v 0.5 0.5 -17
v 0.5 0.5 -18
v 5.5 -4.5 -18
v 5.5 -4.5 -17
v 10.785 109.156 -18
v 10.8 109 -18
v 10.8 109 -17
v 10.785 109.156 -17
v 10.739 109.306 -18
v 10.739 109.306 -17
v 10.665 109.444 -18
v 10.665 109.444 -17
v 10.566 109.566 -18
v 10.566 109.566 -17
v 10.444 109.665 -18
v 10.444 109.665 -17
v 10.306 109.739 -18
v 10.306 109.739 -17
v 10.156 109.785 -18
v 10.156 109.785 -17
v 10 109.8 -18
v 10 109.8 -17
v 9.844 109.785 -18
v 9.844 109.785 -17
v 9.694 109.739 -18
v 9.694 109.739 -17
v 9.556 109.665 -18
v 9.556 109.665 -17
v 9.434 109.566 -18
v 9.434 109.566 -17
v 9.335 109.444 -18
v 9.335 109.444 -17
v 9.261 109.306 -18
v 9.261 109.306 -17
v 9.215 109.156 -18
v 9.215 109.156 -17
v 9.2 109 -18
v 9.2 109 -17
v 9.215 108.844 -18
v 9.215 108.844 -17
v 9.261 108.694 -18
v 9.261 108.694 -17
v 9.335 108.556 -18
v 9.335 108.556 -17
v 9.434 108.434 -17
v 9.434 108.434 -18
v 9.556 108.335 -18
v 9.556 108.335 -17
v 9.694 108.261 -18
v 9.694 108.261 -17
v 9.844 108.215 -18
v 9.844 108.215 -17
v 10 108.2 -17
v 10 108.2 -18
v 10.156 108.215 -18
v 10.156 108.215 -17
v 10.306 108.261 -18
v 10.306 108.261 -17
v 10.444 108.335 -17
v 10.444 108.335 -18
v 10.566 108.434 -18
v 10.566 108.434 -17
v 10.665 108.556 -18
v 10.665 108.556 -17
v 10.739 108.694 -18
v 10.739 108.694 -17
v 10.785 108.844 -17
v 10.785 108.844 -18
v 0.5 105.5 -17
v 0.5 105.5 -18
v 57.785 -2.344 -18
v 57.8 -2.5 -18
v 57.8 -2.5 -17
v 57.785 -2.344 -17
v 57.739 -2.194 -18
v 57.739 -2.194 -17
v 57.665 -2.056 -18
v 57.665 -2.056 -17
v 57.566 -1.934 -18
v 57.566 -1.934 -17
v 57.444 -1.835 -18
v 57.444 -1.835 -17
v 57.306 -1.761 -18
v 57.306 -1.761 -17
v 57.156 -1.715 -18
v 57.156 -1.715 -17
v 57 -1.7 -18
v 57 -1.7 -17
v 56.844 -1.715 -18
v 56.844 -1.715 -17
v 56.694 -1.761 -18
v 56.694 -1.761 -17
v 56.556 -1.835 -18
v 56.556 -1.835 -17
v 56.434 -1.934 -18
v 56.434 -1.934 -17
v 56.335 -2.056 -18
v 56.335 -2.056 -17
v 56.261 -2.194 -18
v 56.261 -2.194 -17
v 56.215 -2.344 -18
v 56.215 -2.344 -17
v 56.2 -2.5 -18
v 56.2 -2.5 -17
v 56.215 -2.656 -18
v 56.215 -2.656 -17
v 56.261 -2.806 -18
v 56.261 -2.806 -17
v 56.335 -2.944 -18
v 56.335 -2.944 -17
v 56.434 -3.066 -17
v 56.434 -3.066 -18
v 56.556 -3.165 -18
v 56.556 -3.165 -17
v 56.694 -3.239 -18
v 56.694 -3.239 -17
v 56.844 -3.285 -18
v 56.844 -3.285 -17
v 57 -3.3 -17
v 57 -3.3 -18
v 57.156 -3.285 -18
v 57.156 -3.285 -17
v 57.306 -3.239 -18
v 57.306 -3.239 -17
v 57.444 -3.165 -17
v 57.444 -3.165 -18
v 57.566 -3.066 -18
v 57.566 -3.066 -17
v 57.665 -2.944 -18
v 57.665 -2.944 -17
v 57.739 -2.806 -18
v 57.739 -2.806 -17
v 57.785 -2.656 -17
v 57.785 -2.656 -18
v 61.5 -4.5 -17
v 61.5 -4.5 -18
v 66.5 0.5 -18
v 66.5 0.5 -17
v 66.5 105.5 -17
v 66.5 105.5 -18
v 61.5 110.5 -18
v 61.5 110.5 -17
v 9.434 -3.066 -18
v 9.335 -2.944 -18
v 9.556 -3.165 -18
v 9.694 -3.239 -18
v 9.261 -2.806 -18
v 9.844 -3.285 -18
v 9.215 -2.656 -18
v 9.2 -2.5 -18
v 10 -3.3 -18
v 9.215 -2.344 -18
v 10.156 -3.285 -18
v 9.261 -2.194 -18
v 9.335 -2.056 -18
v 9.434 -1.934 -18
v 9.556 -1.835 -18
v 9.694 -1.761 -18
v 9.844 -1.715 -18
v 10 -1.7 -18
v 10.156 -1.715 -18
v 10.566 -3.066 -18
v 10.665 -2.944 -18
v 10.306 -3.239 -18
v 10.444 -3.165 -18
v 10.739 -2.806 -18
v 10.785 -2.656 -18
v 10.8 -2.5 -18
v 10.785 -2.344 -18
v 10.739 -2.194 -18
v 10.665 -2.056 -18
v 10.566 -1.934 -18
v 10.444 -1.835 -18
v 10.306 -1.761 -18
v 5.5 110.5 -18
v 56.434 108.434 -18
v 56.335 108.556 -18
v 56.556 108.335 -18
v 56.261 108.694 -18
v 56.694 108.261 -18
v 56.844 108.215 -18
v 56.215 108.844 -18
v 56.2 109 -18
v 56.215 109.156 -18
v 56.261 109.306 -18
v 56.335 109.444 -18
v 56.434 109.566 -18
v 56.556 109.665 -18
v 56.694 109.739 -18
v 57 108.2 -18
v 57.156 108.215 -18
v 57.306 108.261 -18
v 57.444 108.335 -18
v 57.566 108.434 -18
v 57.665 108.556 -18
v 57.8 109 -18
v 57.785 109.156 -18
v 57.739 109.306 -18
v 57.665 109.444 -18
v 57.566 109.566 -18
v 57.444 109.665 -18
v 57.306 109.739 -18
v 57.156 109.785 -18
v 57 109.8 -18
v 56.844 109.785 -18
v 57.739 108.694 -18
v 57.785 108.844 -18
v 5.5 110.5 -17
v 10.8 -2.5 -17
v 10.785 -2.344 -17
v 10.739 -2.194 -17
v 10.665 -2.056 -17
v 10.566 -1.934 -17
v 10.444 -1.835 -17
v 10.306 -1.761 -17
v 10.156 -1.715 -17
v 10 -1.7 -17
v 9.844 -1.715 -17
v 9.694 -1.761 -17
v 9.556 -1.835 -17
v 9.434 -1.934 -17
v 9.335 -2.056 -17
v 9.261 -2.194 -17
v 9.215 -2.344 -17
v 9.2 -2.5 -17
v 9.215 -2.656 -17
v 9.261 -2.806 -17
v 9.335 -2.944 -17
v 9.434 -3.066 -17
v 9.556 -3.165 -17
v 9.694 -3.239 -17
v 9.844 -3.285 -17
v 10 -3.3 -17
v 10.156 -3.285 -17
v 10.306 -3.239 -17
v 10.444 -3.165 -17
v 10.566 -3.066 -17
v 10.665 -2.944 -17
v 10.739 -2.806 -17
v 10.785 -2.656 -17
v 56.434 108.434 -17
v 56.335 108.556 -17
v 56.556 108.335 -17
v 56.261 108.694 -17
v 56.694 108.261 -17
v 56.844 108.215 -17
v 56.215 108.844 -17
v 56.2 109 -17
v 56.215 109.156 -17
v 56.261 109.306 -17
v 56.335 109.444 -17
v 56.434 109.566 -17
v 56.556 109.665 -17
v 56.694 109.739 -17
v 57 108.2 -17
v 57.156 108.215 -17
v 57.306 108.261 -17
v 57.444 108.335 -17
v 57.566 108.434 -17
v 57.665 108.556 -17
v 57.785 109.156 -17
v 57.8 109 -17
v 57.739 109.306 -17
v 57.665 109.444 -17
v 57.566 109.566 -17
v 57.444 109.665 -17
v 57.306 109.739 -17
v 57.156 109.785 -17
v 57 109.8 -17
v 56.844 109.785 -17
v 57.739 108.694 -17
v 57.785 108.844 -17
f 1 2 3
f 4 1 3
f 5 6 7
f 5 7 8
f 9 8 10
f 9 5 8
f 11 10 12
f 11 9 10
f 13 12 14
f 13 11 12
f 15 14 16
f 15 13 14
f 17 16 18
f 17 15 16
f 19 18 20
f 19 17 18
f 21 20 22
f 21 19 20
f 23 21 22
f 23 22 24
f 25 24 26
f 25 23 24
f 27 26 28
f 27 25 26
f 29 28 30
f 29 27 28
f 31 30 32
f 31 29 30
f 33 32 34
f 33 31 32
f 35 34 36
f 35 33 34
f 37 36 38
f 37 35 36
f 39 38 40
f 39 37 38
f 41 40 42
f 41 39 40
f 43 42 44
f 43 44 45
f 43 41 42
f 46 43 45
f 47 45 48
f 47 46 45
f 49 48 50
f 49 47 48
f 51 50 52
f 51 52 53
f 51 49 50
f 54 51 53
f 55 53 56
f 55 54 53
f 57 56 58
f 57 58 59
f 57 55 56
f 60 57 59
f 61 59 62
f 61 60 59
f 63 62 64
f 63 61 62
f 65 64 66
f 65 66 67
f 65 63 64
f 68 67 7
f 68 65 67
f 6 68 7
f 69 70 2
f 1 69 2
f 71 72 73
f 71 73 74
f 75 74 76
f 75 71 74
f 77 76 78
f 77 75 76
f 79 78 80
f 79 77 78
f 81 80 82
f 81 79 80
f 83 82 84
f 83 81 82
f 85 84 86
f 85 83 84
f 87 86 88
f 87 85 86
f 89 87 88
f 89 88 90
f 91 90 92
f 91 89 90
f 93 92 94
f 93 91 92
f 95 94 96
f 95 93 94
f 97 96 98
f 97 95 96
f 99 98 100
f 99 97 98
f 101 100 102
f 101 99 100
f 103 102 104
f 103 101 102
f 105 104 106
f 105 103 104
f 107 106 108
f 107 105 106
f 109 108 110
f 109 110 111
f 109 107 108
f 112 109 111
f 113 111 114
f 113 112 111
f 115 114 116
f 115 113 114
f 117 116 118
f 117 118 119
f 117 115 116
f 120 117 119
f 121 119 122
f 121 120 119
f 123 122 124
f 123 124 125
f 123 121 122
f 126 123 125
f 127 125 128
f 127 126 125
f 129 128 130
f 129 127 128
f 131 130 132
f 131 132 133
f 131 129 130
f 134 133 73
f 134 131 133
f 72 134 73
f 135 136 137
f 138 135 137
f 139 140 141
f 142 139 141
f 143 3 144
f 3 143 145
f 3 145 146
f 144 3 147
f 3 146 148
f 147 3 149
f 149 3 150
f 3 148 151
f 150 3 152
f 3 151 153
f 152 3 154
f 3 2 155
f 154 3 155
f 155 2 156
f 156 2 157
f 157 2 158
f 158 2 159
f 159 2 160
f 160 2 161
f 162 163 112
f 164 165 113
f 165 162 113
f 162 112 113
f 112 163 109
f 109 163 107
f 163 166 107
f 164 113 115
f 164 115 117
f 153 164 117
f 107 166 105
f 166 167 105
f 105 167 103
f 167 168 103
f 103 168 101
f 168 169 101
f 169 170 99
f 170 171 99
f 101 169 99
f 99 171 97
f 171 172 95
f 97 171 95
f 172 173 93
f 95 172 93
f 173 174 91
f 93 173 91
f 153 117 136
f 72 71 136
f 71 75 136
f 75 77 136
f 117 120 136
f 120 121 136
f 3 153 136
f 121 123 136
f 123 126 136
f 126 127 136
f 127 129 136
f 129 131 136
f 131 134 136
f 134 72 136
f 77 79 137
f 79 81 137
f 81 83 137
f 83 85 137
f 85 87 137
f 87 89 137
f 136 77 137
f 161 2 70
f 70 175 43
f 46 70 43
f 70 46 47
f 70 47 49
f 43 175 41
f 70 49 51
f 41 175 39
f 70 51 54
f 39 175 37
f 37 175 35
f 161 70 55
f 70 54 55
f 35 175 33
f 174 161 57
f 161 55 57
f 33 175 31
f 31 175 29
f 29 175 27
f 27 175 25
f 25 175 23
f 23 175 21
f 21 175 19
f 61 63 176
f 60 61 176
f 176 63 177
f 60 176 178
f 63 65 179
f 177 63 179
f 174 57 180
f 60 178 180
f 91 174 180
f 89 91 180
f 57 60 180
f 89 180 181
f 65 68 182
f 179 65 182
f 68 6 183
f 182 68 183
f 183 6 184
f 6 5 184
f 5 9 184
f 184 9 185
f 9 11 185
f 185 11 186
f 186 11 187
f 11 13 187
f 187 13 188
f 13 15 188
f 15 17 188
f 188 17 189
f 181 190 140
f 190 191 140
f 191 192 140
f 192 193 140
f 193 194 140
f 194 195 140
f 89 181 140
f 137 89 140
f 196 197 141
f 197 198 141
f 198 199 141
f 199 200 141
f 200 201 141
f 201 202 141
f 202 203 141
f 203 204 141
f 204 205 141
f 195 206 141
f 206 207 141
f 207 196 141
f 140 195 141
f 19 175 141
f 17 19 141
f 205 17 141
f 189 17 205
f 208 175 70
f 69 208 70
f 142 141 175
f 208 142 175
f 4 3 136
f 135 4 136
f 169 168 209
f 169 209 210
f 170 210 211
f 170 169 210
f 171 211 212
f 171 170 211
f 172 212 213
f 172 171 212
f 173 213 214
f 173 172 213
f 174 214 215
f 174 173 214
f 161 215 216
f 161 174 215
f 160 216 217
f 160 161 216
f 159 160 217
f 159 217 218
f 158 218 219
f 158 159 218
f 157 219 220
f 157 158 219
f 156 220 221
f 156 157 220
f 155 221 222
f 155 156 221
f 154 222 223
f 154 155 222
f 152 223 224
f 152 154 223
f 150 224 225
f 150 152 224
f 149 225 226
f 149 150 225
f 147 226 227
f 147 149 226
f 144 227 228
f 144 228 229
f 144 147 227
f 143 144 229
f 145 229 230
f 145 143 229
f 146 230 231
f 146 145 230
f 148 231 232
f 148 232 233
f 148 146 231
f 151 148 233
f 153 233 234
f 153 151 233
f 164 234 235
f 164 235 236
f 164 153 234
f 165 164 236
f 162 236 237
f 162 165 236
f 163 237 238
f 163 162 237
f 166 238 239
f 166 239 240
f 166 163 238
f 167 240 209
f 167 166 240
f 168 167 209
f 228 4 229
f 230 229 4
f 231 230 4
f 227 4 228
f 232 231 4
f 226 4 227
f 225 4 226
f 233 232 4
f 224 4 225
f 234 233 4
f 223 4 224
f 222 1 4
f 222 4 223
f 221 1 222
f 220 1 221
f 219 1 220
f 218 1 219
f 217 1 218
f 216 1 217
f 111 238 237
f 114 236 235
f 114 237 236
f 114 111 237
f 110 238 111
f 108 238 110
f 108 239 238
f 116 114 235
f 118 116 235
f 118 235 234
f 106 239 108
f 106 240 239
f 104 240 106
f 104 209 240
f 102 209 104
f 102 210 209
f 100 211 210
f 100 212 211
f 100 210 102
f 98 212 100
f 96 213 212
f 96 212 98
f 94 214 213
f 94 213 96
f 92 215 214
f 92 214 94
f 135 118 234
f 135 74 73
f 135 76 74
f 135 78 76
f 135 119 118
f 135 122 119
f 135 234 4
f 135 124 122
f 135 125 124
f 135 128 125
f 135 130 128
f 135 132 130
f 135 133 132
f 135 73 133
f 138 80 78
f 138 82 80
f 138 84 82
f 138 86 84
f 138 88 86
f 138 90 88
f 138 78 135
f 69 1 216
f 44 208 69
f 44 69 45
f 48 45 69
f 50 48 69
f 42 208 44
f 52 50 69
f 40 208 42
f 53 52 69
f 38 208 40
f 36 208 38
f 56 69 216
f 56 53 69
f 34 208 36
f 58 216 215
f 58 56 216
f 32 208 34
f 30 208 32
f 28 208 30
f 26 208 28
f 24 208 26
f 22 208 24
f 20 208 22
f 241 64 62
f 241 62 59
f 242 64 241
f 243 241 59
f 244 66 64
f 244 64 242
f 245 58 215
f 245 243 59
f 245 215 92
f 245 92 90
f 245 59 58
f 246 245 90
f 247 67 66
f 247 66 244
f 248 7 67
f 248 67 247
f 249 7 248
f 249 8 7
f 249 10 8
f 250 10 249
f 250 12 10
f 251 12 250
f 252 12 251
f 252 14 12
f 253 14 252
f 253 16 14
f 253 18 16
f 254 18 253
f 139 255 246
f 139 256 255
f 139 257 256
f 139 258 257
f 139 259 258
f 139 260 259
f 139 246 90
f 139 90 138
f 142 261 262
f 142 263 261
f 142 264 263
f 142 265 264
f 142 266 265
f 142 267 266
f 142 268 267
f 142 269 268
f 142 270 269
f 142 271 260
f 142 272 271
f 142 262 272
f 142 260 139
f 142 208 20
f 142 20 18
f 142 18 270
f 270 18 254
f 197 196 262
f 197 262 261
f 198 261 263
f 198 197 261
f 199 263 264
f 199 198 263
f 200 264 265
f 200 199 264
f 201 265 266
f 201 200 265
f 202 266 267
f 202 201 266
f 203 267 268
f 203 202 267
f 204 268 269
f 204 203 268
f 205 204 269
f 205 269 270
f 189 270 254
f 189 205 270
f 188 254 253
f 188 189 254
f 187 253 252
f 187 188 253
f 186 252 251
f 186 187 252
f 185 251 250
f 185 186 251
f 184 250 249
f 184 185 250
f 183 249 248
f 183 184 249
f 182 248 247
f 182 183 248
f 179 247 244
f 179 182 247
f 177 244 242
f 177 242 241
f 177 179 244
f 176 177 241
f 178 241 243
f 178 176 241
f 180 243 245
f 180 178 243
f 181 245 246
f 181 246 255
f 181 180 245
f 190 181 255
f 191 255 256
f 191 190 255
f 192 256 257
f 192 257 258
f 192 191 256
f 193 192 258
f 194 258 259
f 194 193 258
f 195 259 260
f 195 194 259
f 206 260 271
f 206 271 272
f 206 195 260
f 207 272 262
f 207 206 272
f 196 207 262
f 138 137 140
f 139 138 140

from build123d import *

# Parameters (mm, degrees)
CYLINDER001_R     = 0.8
CYLINDER001_DEPTH = 1
CYLINDER002_R     = 0.8
CYLINDER002_DEPTH = 1
CYLINDER003_R     = 0.8
CYLINDER003_DEPTH = 1
CYLINDER_R        = 0.8
CYLINDER_DEPTH    = 1
PAD003_DEPTH      = 1


with BuildPart() as cylinder001:
    # Cylinder001 → Cylinder001 (new body)
    with BuildSketch(Plane(origin=(57, -2.5, -18), x_dir=(1, 0, 0), z_dir=(0, 0, 1))):
        Circle(CYLINDER001_R)
    extrude(amount=CYLINDER001_DEPTH)


with BuildPart() as cylinder002:
    # Cylinder002 → Cylinder002 (new body)
    with BuildSketch(Plane(origin=(57, 109, -18), x_dir=(1, 0, 0), z_dir=(0, 0, 1))):
        Circle(CYLINDER002_R)
    extrude(amount=CYLINDER002_DEPTH)


with BuildPart() as cylinder003:
    # Cylinder003 → Cylinder003 (new body)
    with BuildSketch(Plane(origin=(10, 109, -18), x_dir=(1, 0, 0), z_dir=(0, 0, 1))):
        Circle(CYLINDER003_R)
    extrude(amount=CYLINDER003_DEPTH)


with BuildPart() as fusion006:
    # Cylinder → Cylinder (new body)
    with BuildSketch(Plane(origin=(10, -2.5, -18), x_dir=(1, 0, 0), z_dir=(0, 0, 1))):
        Circle(CYLINDER_R)
    extrude(amount=CYLINDER_DEPTH)

    # Fusion006: union Cylinder001, Cylinder002, Cylinder003
    add(cylinder001.part)
    add(cylinder002.part)
    add(cylinder003.part)


with BuildPart() as cut002:
    # Sketch003 → Pad003 (new body)
    with BuildSketch(Plane.XY.offset(-18)):
        Polygon((0.5, 0.5), (5.5, -4.5), (61.5, -4.5), (66.5, 0.5), (66.5, 105.5), (61.5, 110.5), (5.5, 110.5), (0.5, 105.5), align=None)
    extrude(amount=PAD003_DEPTH)

    # Cut002: cut Fusion006
    add(fusion006.part, mode=Mode.SUBTRACT)


solid = cut002.part
